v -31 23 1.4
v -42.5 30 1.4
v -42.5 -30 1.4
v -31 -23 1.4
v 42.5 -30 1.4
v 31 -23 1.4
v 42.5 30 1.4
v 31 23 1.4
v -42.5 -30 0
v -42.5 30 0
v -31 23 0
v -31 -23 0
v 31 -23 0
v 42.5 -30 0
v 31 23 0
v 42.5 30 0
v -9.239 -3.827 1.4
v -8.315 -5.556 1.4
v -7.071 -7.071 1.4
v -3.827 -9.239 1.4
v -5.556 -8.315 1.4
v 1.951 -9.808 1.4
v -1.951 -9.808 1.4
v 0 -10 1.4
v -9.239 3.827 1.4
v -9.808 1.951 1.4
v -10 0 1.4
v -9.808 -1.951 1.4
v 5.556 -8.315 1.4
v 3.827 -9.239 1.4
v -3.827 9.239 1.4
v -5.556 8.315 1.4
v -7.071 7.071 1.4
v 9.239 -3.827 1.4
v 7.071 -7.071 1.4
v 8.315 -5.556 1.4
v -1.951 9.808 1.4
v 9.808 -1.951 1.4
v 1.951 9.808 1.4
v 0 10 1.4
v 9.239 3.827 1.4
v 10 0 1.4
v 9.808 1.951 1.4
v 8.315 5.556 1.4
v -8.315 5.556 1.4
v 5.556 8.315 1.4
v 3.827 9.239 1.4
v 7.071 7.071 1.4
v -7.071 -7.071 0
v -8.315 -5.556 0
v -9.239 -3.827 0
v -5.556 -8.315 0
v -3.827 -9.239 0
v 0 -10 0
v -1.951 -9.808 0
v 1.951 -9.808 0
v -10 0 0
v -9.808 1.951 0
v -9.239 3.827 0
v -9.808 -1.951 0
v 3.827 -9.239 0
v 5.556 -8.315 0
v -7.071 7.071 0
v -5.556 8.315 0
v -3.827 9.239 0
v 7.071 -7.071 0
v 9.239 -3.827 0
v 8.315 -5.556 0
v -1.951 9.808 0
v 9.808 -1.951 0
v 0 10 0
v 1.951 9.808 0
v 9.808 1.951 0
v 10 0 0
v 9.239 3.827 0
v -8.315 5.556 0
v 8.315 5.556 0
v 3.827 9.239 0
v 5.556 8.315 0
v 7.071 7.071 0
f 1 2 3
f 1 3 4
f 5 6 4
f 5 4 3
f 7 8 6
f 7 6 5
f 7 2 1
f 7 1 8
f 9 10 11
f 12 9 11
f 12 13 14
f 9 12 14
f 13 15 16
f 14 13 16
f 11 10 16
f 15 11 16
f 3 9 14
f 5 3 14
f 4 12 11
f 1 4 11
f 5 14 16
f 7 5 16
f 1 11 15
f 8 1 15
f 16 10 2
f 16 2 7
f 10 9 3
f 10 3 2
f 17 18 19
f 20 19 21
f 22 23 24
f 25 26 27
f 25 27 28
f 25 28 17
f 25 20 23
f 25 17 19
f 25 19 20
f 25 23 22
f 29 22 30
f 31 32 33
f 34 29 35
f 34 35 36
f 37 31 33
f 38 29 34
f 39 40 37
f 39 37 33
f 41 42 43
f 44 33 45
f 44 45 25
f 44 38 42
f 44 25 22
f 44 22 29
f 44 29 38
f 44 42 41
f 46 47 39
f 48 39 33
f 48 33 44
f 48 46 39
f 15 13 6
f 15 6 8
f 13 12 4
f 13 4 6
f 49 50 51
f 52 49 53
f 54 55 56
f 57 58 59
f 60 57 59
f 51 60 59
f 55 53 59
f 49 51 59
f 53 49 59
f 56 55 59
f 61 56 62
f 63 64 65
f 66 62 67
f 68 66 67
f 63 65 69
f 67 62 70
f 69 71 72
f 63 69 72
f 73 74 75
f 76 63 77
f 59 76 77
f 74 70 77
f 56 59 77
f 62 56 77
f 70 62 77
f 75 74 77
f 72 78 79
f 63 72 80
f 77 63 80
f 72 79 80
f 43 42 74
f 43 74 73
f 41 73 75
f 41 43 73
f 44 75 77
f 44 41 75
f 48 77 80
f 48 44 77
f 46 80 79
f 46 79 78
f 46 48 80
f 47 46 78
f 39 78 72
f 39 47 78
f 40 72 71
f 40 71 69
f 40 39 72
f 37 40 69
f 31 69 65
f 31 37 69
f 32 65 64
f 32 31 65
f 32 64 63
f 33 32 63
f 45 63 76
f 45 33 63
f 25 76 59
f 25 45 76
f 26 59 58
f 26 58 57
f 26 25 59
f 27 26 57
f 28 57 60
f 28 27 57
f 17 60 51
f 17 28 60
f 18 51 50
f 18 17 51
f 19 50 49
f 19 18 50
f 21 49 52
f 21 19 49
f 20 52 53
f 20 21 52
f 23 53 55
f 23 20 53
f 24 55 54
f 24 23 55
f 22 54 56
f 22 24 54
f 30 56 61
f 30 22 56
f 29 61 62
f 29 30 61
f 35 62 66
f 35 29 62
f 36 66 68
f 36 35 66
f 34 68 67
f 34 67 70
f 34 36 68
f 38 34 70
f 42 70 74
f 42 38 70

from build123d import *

# Parameters (mm, degrees)
SKETCH_1_W      = 85
SKETCH_1_H      = 60
SKETCH_1_W_2    = 62
SKETCH_1_H_2    = 46
EXTRUDE_1_DEPTH = 1.4
SKETCH_2_R      = 10
EXTRUDE_2_DEPTH = 1.4


with BuildPart() as part:
    # 草图1 → 凸台-拉伸1 (new body)
    with BuildSketch(Plane.XY):
        Rectangle(SKETCH_1_W, SKETCH_1_H)
        Rectangle(SKETCH_1_W_2, SKETCH_1_H_2, mode=Mode.SUBTRACT)
    extrude(amount=EXTRUDE_1_DEPTH)


with BuildPart() as body_2:
    # 草图2 → 凸台-拉伸2 (new body)
    with BuildSketch(Plane.XY.offset(1.4)):
        Circle(SKETCH_2_R)
    extrude(amount=-EXTRUDE_2_DEPTH)


solid = Compound([part.part, body_2.part])
